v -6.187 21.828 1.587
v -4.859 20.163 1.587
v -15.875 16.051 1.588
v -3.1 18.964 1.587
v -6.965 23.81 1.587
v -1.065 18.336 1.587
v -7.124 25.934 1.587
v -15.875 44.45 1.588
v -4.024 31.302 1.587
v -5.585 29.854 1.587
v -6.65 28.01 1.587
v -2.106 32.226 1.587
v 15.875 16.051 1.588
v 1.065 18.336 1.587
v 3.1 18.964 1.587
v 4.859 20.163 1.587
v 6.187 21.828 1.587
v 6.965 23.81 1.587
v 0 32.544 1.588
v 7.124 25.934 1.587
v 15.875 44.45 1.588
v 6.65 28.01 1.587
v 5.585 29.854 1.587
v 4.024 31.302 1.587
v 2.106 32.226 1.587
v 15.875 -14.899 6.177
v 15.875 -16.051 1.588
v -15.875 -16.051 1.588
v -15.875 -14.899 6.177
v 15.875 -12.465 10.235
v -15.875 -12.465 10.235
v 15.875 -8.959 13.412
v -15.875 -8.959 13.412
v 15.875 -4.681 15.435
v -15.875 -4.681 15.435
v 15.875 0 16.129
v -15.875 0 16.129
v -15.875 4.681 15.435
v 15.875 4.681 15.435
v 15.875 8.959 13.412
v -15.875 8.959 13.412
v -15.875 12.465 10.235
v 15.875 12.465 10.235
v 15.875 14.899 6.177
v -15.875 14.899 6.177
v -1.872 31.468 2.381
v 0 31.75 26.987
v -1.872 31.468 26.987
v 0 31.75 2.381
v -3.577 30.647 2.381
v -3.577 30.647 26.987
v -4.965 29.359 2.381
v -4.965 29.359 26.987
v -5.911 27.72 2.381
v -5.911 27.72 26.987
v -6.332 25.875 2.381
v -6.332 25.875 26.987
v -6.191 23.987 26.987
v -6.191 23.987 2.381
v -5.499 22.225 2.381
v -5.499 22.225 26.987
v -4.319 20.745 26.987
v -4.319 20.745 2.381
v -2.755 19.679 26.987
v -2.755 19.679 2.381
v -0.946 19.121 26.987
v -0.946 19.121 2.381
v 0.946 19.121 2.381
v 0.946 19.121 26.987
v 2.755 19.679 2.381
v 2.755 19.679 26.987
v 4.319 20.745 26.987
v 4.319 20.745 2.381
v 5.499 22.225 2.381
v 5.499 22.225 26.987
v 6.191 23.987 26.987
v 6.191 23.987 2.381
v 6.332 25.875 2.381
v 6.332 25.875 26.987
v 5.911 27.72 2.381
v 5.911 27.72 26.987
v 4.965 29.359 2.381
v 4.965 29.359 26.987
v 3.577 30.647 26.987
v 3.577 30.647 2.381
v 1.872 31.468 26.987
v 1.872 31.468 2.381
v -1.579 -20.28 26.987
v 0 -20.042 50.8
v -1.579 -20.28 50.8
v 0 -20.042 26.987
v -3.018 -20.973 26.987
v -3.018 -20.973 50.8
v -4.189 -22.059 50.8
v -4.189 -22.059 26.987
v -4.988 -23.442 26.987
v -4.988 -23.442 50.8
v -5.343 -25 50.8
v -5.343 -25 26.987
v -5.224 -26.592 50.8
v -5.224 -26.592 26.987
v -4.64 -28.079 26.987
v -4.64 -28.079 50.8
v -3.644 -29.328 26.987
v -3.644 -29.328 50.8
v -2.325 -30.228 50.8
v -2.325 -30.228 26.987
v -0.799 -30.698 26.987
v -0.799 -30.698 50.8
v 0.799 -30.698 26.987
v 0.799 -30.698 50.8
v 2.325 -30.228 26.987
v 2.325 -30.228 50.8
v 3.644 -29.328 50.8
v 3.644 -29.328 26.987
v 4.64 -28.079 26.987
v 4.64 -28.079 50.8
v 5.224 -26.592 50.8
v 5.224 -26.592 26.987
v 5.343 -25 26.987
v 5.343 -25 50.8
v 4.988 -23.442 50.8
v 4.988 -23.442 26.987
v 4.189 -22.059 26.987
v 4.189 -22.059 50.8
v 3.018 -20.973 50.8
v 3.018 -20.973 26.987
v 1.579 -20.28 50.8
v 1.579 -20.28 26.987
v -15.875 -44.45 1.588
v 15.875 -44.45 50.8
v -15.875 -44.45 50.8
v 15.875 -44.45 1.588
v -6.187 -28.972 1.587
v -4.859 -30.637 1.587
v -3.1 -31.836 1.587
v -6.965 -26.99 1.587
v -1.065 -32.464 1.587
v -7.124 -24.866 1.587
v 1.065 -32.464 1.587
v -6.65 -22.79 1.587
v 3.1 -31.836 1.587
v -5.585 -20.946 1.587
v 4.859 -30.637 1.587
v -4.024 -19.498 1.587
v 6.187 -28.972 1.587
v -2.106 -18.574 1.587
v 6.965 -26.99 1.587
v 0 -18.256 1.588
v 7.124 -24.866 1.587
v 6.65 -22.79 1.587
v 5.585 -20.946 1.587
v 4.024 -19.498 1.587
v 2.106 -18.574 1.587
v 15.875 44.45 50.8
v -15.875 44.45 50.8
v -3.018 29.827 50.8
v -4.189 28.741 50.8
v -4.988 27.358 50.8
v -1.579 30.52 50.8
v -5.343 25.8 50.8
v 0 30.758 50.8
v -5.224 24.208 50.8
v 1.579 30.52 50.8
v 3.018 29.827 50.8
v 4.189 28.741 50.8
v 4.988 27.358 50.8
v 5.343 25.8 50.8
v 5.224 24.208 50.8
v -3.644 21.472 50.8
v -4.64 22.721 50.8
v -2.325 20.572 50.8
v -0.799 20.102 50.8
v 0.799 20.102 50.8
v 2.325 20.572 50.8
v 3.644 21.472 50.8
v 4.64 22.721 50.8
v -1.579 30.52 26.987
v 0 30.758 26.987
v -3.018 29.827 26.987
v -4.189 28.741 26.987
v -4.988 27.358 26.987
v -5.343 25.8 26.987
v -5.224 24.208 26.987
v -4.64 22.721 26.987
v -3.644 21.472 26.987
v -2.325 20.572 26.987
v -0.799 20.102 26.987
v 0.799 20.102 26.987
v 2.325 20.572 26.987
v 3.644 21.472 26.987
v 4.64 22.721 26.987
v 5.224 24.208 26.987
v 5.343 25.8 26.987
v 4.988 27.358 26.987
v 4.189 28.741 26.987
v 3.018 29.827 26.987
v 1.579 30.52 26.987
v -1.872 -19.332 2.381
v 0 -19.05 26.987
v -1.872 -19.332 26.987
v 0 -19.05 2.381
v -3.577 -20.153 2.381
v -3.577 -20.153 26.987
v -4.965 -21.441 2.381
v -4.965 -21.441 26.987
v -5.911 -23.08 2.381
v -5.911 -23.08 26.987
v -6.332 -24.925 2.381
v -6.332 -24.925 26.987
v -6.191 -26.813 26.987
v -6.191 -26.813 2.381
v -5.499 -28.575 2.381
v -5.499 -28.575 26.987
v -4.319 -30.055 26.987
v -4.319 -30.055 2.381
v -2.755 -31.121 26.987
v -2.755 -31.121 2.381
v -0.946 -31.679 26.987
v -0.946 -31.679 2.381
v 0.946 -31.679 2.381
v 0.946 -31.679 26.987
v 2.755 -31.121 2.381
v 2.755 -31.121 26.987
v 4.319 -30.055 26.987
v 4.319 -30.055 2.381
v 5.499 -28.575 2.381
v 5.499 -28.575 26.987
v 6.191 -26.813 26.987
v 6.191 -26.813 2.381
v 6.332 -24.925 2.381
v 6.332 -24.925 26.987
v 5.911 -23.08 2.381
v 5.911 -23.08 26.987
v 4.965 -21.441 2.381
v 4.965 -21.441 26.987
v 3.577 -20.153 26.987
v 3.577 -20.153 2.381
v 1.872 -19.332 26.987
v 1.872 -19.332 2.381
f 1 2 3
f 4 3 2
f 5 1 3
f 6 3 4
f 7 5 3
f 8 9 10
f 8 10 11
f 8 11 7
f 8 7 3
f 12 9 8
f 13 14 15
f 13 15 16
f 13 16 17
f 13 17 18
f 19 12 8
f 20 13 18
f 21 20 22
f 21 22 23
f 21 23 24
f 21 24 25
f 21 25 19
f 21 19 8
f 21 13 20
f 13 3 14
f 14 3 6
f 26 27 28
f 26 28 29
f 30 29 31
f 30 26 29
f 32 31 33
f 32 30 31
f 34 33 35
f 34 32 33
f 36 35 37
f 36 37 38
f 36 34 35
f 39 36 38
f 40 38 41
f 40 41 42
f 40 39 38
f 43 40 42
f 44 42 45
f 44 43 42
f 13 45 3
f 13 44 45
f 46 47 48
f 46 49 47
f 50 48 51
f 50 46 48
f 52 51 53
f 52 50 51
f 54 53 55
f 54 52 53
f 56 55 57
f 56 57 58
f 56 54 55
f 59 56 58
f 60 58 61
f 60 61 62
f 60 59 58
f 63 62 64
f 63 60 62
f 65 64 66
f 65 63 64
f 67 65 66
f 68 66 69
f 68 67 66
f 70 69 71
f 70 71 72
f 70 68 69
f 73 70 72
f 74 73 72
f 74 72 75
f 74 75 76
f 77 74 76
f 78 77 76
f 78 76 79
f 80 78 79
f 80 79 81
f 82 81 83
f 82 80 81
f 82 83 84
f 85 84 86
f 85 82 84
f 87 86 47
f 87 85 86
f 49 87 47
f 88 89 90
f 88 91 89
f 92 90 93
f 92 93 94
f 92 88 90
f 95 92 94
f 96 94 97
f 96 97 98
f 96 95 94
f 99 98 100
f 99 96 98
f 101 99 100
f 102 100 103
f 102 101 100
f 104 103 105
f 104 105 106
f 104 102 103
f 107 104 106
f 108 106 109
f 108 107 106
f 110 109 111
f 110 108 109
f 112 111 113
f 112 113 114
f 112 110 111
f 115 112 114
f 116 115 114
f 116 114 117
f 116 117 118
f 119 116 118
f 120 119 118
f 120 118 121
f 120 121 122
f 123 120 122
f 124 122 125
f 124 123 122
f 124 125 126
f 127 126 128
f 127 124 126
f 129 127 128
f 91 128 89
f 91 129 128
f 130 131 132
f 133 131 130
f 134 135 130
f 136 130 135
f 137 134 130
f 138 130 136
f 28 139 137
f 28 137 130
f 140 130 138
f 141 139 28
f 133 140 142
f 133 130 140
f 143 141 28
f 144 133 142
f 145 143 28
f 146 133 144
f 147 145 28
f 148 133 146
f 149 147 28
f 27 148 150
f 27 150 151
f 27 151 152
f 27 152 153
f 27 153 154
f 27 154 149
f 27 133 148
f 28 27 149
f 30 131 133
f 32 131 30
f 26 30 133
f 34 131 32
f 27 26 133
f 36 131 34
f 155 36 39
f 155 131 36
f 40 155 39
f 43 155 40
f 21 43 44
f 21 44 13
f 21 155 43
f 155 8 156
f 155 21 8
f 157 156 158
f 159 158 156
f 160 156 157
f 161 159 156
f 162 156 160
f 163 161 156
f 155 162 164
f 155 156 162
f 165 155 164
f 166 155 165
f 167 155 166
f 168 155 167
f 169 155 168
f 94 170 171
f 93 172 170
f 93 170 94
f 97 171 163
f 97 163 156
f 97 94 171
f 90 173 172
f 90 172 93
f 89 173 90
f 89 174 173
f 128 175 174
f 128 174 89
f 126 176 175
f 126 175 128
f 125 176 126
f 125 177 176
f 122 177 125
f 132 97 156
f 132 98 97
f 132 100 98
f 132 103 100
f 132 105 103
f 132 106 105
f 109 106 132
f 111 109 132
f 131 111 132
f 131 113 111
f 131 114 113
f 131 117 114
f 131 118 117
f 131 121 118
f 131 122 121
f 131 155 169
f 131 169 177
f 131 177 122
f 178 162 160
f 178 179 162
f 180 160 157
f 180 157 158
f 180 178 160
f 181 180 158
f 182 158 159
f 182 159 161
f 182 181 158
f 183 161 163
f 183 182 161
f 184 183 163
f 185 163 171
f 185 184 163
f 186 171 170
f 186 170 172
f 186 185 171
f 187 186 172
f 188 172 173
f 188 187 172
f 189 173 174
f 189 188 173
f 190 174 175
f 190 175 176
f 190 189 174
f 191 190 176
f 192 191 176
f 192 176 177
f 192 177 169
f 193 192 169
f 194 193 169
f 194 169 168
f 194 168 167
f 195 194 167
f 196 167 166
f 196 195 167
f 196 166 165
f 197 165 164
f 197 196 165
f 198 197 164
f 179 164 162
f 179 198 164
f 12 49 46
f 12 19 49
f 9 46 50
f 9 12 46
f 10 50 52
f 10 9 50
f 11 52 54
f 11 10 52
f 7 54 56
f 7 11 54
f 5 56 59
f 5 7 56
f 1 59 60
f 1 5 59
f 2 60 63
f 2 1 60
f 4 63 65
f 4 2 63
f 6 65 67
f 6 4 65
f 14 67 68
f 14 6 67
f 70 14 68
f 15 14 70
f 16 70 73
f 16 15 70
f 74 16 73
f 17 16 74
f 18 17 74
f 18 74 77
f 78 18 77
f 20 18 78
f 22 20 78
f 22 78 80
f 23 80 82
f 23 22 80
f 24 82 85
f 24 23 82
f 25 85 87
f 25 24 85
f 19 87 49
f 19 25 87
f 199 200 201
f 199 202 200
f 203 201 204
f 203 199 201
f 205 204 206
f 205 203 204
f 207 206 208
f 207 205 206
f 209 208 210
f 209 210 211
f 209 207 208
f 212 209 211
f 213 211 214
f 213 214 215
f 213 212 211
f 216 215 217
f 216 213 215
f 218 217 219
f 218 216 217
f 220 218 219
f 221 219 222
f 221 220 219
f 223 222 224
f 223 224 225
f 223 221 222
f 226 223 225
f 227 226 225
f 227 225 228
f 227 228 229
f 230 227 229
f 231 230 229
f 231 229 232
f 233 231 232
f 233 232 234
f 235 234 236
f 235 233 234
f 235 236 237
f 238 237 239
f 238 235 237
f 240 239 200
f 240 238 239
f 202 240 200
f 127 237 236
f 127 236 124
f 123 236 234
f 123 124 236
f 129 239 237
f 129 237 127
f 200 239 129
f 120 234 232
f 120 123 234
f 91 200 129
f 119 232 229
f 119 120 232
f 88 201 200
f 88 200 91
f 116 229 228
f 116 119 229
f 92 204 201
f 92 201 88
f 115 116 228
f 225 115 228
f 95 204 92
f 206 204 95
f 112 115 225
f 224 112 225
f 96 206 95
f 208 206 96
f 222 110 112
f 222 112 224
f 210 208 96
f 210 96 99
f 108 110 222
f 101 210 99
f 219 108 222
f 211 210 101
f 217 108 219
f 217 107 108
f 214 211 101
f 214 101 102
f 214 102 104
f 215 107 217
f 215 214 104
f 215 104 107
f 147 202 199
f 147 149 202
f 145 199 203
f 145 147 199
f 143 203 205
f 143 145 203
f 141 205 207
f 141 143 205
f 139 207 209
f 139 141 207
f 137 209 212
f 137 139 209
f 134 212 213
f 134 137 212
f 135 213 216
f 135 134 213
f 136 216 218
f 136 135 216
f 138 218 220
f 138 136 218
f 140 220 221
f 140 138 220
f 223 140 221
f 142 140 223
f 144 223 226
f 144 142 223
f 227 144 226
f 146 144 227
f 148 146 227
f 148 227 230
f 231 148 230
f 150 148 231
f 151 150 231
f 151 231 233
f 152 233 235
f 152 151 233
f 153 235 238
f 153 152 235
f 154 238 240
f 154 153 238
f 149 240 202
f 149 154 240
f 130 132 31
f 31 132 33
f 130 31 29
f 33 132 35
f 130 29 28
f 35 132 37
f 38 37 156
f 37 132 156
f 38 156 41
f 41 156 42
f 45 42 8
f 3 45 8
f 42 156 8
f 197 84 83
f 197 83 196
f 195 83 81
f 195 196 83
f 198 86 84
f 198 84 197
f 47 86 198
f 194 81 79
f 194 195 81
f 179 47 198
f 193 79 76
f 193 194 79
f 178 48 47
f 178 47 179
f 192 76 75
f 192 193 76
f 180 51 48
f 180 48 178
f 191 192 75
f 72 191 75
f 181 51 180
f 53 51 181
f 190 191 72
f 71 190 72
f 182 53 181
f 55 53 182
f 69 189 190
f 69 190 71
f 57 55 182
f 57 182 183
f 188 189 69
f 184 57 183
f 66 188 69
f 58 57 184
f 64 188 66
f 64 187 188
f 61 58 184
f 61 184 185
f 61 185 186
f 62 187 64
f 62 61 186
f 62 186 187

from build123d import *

# Parameters (mm, degrees)
BASE_EXTRUDE_DEPTH               = 15.875
F_1_2_13_TAPPED_HOLE2_AT_2_COUNT = 2
F_1_2_13_TAPPED_HOLE2_AT_2_PITCH = 50.8


with BuildPart() as part:
    # Sketch1 → Base-Extrude (new, symmetric)
    with BuildSketch(Plane(origin=(0, 0, 0), x_dir=(0, 0, -1), z_dir=(1, 0, 0))):
        with BuildLine():
            Line((-50.8, 44.45), (-50.8, -44.45))
            Line((-50.8, -44.45), (-1.5875, -44.45))
            Line((-1.5875, -44.45), (-1.5875, -16.050684869))
            ThreePointArc((-1.5875, -16.050684869), (-16.129, 0), (-1.5875, 16.050684869))
            Line((-1.5875, 16.050684869), (-1.5875, 44.45))
            Line((-1.5875, 44.45), (-50.8, 44.45))
        make_face()
    extrude(amount=BASE_EXTRUDE_DEPTH, both=True)

    # Sketch6 → 1/2-13 Tapped Hole2 (revolve, cut)
    with BuildSketch(Plane(origin=(0, 25.4, 1.5875), x_dir=(0, 1, 0), z_dir=(1, 0, 0))):
        Polygon((0, 0), (0, 49.2125), (5.35813, 49.2125), (5.35813, 25.4), (6.35, 25.4), (6.35, 0.79375), (7.14375, 0), align=None)
    f_1_2_13_tapped_hole2 = revolve(axis=Axis((0, 25.4, -4.7625), (0, 0, 1)), mode=Mode.SUBTRACT)

    # 1/2-13 Tapped Hole2 at 2: 1/2-13 Tapped Hole2 ×2
    with Locations(*[(0, -i * F_1_2_13_TAPPED_HOLE2_AT_2_PITCH, 0) for i in range(1, F_1_2_13_TAPPED_HOLE2_AT_2_COUNT)]):
        add(f_1_2_13_tapped_hole2, mode=Mode.SUBTRACT)


solid = part.part
